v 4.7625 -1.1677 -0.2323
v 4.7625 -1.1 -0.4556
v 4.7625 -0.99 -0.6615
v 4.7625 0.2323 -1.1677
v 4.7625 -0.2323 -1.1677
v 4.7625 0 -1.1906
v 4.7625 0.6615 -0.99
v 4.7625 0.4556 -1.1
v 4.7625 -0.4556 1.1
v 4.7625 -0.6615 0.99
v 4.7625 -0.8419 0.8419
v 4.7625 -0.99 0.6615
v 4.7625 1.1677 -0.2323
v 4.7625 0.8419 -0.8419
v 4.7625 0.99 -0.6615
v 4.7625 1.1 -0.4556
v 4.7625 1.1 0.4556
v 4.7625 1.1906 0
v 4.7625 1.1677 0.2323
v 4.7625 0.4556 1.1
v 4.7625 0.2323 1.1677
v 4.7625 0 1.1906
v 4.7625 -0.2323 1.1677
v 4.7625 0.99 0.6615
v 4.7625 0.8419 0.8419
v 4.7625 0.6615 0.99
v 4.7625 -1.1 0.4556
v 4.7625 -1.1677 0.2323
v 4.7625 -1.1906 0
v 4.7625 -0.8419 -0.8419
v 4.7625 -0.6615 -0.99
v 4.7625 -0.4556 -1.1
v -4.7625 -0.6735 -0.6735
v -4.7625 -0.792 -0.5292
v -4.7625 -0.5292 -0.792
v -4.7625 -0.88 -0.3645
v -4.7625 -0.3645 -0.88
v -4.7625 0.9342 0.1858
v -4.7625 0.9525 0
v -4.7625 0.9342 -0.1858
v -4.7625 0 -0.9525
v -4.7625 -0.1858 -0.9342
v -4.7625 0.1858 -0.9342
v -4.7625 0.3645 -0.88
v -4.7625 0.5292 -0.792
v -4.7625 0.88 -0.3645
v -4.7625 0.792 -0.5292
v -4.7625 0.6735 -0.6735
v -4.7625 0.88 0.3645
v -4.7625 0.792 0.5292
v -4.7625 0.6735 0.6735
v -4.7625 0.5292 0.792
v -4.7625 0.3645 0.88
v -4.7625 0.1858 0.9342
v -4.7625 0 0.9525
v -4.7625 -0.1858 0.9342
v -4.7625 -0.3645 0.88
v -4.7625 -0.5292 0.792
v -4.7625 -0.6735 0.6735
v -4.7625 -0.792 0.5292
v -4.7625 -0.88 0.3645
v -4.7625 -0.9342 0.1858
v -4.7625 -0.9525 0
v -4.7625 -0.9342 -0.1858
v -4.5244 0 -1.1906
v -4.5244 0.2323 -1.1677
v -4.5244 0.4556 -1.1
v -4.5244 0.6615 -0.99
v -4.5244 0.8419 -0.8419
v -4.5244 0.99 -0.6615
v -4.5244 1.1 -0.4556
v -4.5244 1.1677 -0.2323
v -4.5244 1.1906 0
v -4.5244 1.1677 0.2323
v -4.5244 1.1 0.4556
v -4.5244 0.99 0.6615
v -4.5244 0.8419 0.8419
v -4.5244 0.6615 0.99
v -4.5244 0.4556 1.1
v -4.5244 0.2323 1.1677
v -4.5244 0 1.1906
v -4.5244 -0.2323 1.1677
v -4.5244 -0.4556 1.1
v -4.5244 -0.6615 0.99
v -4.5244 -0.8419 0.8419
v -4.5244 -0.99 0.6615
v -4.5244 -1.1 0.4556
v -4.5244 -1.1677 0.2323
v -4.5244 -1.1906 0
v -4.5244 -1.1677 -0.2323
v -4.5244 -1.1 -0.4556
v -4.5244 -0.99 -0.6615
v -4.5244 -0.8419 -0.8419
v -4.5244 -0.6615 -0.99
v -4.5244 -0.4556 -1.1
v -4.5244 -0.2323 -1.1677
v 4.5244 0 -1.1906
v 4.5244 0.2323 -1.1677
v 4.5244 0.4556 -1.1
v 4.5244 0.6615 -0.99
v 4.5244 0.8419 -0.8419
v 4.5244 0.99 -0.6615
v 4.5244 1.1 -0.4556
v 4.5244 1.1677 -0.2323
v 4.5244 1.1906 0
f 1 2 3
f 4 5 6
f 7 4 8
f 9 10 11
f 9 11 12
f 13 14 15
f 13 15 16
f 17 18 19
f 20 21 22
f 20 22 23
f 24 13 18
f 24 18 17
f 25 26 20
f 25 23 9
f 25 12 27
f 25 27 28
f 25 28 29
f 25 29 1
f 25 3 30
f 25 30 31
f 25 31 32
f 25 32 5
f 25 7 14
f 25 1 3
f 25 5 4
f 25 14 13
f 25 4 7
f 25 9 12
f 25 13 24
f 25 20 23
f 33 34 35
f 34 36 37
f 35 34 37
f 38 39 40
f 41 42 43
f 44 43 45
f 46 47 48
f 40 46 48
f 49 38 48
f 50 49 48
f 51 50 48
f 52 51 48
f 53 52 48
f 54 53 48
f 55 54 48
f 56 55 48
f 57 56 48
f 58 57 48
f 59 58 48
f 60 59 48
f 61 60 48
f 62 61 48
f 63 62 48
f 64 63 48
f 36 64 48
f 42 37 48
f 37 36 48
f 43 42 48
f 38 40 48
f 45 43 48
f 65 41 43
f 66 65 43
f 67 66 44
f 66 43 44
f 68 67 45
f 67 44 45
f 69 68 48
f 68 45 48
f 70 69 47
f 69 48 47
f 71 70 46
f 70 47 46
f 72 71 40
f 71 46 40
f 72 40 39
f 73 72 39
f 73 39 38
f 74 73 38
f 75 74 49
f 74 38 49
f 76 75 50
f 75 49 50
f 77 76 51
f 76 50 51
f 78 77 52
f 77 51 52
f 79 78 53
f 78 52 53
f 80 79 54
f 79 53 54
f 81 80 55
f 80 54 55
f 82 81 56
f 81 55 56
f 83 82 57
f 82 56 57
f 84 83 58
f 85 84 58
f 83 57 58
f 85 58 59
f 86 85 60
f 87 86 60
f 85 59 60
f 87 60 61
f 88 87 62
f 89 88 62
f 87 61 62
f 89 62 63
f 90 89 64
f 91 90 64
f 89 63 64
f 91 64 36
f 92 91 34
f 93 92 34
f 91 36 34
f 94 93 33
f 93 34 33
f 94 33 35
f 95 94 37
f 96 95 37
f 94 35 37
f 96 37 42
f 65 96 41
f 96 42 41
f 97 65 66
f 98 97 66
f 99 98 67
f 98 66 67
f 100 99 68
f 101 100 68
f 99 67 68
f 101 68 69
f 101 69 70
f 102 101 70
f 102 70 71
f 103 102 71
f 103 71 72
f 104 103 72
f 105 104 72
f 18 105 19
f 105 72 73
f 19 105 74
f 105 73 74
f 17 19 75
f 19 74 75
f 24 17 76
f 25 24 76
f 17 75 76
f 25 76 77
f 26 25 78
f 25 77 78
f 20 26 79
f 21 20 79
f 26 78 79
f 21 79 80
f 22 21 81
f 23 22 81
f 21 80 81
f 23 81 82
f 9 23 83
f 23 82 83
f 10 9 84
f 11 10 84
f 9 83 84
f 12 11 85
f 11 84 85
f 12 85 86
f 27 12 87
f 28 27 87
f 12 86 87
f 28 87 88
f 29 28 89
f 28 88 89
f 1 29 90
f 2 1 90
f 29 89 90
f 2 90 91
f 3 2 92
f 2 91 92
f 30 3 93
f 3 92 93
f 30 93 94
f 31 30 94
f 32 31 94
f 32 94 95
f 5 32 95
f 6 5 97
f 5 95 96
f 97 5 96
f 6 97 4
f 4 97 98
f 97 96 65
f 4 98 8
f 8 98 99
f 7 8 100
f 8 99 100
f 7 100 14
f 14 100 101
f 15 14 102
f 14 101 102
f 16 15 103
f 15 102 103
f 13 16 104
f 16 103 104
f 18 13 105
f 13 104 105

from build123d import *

# Parameters (mm, degrees)
EXTRUDE1_DEPTH        = 4.7625
EXTRUDE1_DEPTH_BACK   = 4.7625
SKETCH2_R             = 1.190625
CHAMFER1_SIZE         = 0.238125
DELETEFACE1_START     = 4.5243749
DELETEFACE1_OUTLINE_R = 1.190625
DELETEFACE1_DEPTH     = 0.2381251


# Read off the part's stored shape, not the designer's step: DeleteFace1
with BuildPart() as part:
    # Sketch2 → Extrude1 (new, two sides: drawn at the far end of the back side and taken through both)
    with BuildSketch(Plane(origin=(0, 0, 0), x_dir=(0, 0, -1), z_dir=(1, 0, 0)).offset(-EXTRUDE1_DEPTH_BACK)):
        Circle(SKETCH2_R)
    extrude(amount=EXTRUDE1_DEPTH + EXTRUDE1_DEPTH_BACK)

    # Chamfer1
    chamfer1_edges = [part.edges().sort_by_distance(p)[0] for p in [
        (-4.7625, 0, 1.190625),
        (4.7625, 0, 1.190625),
    ]]
    chamfer(chamfer1_edges, length=CHAMFER1_SIZE)

    # DeleteFace1 outline → DeleteFace1 (add)
    with BuildSketch(Plane.YZ.offset(DELETEFACE1_START)):
        Circle(DELETEFACE1_OUTLINE_R)
    extrude(amount=DELETEFACE1_DEPTH)


solid = part.part
